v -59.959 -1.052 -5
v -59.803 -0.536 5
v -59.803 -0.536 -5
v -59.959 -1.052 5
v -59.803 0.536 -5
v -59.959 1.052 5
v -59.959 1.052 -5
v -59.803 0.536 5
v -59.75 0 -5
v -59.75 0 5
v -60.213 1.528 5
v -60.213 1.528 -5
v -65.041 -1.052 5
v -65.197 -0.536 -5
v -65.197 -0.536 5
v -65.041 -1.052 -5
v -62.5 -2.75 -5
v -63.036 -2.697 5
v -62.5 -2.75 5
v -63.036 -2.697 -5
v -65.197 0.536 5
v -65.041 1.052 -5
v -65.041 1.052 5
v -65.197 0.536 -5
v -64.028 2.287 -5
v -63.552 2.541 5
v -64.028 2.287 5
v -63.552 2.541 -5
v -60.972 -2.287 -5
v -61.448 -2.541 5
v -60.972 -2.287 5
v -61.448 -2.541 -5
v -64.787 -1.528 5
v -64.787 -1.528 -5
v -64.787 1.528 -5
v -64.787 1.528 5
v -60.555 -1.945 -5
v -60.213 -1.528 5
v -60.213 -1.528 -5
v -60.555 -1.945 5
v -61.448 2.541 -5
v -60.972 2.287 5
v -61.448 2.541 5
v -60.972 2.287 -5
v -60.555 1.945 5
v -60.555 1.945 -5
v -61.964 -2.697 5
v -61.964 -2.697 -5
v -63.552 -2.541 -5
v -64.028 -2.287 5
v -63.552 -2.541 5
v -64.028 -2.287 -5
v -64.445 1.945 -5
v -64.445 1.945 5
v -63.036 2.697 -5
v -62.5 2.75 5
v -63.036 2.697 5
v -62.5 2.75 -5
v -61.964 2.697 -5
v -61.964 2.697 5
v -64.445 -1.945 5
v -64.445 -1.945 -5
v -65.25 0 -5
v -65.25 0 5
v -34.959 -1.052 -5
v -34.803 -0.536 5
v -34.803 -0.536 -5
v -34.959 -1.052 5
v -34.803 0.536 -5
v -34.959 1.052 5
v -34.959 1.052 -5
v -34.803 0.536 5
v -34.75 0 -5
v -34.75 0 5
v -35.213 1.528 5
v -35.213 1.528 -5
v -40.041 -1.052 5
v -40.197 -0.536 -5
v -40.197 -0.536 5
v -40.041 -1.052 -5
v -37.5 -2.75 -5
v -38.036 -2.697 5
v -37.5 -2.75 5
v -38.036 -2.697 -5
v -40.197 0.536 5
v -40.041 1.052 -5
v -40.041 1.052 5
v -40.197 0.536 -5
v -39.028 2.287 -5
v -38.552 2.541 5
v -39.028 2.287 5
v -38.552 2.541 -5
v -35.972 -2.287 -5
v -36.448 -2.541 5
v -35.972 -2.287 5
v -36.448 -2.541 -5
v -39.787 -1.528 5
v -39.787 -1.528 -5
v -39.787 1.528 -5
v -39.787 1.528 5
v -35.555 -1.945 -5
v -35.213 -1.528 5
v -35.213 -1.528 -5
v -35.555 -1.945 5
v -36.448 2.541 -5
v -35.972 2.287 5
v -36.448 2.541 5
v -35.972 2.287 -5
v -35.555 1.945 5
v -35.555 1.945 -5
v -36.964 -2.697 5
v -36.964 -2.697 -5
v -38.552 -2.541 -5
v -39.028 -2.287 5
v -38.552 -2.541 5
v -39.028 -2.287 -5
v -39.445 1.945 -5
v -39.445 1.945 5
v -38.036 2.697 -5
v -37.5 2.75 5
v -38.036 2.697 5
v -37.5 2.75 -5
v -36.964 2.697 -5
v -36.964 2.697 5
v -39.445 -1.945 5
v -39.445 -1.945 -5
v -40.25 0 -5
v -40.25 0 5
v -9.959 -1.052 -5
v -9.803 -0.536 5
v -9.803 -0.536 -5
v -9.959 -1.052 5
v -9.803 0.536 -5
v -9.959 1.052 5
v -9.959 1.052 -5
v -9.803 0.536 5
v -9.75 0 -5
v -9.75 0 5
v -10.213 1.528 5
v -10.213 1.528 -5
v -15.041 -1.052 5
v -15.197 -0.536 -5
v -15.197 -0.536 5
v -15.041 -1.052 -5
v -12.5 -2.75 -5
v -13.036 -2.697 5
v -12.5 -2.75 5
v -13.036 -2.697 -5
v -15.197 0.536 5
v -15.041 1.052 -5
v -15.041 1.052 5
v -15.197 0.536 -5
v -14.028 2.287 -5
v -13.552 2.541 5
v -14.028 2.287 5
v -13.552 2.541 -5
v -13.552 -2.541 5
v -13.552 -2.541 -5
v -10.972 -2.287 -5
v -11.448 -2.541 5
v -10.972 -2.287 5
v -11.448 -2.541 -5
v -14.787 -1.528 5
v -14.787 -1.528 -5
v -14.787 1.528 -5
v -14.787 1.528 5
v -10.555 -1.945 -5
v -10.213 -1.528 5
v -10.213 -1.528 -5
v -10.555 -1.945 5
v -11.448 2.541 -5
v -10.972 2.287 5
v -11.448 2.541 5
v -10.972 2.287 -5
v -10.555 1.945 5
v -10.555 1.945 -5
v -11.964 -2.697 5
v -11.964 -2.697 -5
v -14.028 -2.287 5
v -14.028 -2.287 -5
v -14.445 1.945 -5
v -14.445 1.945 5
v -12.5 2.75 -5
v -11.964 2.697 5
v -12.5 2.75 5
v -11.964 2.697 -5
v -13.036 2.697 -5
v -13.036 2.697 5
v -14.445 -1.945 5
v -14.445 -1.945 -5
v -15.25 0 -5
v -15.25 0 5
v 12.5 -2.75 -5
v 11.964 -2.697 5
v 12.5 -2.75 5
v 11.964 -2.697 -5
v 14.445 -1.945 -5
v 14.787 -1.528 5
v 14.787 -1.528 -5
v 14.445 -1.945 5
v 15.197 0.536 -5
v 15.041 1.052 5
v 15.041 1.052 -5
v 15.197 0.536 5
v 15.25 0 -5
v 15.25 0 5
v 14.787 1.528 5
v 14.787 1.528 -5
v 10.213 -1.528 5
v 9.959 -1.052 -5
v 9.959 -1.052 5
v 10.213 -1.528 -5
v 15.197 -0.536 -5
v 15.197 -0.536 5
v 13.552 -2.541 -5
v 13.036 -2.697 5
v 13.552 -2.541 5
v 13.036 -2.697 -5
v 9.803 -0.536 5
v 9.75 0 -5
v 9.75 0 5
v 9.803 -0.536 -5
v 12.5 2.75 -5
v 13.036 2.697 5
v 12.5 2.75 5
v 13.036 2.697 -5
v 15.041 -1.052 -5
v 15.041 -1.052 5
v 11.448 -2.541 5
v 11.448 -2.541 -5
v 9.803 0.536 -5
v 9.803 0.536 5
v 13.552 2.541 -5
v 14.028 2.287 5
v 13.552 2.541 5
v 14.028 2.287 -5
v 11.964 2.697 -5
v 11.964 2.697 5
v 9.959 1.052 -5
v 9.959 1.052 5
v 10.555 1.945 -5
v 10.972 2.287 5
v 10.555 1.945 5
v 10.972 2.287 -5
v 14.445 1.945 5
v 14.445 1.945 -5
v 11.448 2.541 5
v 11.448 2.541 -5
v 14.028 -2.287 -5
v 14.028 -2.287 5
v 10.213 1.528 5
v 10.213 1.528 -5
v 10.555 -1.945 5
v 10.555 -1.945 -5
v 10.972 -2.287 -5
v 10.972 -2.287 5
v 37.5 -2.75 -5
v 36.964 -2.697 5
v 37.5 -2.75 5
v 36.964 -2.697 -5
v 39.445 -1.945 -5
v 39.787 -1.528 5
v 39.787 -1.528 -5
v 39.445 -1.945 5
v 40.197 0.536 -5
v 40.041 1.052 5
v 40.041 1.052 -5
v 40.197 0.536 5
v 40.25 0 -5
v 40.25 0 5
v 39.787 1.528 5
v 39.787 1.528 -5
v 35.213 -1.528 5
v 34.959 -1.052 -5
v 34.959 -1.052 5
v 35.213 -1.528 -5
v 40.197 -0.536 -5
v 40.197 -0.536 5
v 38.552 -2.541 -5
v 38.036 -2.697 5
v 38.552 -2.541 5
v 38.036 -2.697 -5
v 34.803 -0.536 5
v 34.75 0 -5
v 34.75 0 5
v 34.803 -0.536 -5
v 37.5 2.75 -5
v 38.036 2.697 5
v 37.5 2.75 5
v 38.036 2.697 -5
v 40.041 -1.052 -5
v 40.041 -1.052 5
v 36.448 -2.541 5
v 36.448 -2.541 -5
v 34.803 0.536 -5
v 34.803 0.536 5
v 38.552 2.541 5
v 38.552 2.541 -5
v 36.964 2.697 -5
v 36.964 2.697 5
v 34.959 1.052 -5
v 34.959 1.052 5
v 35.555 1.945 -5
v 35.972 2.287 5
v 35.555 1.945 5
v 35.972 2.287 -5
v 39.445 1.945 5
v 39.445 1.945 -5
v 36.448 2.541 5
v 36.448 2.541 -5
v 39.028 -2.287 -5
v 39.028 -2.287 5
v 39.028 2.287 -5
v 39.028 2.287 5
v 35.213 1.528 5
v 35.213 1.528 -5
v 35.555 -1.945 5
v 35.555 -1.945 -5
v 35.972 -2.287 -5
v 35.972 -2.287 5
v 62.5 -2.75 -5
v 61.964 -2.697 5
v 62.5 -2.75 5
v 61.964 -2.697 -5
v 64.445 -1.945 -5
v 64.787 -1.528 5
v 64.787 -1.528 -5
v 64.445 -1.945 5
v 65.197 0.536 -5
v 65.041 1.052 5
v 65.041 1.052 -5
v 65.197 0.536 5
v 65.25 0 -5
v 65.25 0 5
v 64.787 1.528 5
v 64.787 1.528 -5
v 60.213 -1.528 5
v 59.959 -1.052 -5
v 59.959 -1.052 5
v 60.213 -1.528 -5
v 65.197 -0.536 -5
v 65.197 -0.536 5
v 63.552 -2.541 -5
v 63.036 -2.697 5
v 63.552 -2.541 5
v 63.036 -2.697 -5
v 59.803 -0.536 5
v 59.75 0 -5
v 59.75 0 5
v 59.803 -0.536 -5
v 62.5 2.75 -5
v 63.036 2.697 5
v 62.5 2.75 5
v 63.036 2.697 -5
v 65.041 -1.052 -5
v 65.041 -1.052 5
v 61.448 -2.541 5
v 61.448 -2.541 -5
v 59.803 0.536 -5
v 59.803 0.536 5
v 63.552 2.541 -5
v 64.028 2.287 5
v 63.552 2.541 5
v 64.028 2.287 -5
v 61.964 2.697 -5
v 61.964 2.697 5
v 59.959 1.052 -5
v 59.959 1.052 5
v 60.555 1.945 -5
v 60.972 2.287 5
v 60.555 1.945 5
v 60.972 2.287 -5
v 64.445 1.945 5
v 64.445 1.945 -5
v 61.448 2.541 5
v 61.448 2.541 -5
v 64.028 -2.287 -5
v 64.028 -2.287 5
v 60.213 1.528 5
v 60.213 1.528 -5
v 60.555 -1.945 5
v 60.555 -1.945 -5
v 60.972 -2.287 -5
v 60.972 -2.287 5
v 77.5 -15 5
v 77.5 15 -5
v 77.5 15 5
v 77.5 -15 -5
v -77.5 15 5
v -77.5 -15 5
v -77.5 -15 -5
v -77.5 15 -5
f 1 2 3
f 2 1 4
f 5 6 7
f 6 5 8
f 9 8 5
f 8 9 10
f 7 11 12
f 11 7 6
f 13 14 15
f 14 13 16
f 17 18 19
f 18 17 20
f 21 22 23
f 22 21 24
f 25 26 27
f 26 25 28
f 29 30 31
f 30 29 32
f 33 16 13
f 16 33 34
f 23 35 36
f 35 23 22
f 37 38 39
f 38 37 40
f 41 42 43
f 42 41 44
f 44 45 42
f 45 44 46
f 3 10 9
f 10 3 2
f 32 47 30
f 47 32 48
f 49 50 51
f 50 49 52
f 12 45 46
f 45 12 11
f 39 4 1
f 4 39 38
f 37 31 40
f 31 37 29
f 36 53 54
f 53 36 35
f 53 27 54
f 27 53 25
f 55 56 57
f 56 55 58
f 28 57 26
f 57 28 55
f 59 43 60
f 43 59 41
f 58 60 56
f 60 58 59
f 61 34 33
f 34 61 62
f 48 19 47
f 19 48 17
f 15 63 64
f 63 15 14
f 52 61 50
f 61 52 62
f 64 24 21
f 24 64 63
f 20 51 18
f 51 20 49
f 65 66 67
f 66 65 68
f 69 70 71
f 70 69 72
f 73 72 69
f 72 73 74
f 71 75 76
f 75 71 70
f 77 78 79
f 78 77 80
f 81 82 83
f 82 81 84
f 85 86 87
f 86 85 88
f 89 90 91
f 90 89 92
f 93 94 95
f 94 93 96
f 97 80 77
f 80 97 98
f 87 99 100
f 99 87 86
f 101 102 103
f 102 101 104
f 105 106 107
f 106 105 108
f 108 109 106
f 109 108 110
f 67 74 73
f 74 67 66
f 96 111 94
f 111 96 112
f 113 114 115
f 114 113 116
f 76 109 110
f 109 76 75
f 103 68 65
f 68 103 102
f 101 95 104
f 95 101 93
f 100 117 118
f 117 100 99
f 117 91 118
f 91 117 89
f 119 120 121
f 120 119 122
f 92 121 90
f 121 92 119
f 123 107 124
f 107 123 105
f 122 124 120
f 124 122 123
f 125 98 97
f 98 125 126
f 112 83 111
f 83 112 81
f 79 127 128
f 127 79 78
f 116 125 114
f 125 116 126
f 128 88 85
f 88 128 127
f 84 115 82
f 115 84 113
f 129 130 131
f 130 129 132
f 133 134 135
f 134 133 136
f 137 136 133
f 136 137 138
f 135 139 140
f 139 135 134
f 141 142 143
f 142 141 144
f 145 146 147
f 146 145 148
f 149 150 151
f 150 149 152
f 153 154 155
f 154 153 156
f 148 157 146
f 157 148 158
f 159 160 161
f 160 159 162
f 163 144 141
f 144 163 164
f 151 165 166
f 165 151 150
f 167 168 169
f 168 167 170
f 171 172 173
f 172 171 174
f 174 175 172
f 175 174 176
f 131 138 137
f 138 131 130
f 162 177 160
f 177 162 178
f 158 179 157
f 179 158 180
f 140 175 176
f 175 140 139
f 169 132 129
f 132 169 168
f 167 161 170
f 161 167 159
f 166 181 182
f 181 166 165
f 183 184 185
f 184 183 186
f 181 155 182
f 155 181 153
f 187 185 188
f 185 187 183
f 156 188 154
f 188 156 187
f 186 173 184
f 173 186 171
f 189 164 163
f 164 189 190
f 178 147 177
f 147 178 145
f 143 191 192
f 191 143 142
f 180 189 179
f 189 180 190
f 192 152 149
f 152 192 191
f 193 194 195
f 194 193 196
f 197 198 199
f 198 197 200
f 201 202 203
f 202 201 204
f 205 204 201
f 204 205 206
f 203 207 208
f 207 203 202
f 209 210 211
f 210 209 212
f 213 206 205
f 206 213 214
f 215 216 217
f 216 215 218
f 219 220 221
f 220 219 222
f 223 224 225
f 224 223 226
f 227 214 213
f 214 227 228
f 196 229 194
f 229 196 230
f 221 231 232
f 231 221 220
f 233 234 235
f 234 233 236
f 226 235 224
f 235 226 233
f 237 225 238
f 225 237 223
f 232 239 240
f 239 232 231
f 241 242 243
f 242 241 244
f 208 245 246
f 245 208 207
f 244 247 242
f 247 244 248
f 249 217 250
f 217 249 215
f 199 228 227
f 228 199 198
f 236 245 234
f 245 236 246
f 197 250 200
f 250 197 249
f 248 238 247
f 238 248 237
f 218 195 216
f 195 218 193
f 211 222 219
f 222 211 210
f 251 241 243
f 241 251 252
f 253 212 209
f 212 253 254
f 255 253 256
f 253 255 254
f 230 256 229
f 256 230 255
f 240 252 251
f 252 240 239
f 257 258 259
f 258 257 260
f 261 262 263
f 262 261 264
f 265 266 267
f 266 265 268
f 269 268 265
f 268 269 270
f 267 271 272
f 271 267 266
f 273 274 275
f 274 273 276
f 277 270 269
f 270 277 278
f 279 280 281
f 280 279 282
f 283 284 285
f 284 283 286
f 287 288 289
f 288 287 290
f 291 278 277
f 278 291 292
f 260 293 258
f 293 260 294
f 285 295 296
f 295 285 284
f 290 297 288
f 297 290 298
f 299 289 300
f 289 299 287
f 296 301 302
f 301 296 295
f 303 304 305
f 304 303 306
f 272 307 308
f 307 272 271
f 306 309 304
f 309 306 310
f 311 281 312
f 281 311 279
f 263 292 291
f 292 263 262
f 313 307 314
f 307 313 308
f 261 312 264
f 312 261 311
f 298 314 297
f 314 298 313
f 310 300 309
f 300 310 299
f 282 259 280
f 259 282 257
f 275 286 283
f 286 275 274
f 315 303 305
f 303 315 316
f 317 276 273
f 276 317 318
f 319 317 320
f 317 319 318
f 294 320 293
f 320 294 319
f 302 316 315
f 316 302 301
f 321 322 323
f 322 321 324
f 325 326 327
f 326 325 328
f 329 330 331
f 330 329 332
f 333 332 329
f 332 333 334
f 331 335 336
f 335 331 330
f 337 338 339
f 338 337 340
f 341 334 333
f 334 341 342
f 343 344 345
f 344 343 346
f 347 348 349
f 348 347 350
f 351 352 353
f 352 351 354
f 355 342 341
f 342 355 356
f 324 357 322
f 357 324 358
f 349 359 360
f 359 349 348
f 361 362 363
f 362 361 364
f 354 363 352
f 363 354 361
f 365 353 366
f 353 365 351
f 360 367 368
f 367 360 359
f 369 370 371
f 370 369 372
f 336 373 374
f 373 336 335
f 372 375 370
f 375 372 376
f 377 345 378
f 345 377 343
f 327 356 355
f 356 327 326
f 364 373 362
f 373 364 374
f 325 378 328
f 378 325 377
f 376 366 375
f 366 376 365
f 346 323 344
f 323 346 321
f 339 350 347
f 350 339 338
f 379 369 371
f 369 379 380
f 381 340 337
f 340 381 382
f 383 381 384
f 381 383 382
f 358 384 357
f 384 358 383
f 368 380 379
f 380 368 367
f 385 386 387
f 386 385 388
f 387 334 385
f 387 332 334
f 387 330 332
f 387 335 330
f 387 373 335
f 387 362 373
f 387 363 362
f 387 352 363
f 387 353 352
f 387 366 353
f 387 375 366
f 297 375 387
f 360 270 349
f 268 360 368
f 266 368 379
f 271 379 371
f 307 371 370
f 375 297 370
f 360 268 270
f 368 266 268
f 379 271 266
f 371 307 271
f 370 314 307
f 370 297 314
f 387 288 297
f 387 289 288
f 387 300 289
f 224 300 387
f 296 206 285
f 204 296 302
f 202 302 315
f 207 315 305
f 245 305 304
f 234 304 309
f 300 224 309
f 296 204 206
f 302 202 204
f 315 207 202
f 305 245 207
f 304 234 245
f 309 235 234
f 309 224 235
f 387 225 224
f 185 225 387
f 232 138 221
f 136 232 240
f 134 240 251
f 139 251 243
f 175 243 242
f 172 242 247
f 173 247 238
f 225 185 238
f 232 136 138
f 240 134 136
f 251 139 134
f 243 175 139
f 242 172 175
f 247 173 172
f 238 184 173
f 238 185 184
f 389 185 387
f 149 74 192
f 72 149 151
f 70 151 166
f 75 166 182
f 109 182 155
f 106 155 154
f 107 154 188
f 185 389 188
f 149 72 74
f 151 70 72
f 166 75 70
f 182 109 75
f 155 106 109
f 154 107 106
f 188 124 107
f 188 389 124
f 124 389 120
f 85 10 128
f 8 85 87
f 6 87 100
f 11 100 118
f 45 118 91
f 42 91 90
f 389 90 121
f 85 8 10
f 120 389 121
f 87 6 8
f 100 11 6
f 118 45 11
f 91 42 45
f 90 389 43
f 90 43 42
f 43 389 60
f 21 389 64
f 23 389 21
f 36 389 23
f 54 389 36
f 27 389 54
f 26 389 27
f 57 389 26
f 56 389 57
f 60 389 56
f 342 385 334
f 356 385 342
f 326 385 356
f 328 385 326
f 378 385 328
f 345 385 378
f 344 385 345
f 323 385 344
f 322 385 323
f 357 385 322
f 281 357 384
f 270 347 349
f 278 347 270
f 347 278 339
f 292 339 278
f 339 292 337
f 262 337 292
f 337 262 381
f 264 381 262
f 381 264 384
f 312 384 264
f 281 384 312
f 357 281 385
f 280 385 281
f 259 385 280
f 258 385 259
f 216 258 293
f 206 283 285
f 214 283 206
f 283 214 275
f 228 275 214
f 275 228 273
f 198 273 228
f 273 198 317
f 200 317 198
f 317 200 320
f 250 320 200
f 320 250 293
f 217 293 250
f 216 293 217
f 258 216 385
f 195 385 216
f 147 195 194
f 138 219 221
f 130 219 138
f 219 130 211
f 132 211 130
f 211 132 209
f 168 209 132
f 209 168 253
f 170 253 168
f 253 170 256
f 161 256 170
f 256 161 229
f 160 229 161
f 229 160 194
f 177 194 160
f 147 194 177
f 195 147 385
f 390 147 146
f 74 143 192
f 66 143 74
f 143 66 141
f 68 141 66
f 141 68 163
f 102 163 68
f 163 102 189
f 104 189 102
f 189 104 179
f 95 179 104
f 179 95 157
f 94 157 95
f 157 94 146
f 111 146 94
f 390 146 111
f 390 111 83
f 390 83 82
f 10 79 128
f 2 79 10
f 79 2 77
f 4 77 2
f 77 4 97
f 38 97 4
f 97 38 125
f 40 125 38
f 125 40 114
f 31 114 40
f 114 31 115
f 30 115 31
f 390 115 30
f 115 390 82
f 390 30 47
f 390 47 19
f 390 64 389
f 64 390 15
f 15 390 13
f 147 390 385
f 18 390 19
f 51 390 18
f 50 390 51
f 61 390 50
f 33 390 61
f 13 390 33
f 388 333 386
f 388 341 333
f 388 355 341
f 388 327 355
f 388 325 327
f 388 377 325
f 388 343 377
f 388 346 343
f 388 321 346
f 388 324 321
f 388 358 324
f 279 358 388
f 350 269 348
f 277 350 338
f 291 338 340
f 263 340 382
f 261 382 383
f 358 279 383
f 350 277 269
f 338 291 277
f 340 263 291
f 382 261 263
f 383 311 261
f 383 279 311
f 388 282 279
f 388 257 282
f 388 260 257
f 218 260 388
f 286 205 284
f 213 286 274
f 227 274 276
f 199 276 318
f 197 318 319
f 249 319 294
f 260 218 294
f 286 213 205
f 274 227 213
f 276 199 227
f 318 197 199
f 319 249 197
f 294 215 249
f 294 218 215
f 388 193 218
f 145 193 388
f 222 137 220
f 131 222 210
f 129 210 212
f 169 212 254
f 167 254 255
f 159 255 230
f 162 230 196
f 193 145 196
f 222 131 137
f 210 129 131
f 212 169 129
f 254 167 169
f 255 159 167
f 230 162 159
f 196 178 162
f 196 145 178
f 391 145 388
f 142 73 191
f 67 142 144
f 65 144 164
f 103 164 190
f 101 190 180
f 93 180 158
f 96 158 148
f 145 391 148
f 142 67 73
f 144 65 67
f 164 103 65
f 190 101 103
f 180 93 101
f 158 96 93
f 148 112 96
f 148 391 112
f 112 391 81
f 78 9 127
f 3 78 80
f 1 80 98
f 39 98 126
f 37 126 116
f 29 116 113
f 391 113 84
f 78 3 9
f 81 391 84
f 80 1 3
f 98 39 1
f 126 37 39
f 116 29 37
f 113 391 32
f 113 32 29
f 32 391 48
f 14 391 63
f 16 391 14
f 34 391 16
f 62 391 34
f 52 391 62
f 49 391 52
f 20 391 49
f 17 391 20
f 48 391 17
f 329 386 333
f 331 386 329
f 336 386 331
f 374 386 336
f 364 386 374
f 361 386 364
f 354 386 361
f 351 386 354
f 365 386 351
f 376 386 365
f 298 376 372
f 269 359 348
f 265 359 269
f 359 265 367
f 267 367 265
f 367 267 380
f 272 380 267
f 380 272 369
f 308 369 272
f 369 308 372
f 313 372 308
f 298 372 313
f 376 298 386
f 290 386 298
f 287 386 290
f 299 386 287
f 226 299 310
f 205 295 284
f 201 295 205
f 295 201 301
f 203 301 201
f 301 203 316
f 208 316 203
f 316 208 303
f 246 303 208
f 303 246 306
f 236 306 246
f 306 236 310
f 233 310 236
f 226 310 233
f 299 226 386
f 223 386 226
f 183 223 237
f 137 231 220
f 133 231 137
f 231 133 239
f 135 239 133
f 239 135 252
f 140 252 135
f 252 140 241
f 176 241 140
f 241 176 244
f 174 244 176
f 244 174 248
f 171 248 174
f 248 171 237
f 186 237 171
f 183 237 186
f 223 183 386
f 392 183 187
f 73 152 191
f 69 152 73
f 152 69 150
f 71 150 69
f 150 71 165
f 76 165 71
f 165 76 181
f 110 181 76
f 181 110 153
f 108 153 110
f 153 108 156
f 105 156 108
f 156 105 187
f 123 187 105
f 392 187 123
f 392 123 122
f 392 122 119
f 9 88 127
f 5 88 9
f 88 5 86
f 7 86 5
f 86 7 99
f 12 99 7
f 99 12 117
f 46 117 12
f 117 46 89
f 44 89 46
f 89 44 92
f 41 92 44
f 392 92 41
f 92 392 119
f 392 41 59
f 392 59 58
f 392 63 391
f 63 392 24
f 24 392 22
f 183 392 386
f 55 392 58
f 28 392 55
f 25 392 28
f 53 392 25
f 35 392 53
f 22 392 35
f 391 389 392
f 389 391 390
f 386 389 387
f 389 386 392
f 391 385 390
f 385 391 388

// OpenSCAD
$fn = 32;

// ----------------------------------------------------------------------
// Hole bar, 6 x Ø5.5
// row layout, 15 mm edge offset
// ----------------------------------------------------------------------

// --- parameters (mm) ---
bar_w = 30;    // bar width (Y)
bar_t = 10;    // bar thickness (Z)
holes = 6;     // holes per row
hole_d = 5.5;  // hole diameter
edge = 15;     // offset from the bar end to the first hole
pitch = 25;    // pitch between neighbouring holes

// --- derived feature positions (mm) ---
span = (holes - 1) * pitch;   // = 125   distance between the end holes
bar_l = span + 2 * edge;      // = 155   overall bar length
start_x = -bar_l / 2 + edge;  // = -62.5   X of the first hole
feature_centers = [
  [start_x + 0 * pitch, 0],
  [start_x + 1 * pitch, 0],
  [start_x + 2 * pitch, 0],
  [start_x + 3 * pitch, 0],
  [start_x + 4 * pitch, 0],
  [start_x + 5 * pitch, 0]
];   // hole centres of the first row

// bar with one row of holes, drilled from feature_centers
difference() {
  translate([-bar_l / 2, -bar_w / 2, -bar_t / 2]) cube([bar_l, bar_w, bar_t]);
  for (centre = feature_centers)
    translate([centre[0], centre[1], 0])
      cylinder(d = hole_d, h = bar_t + 2, center = true);
}
